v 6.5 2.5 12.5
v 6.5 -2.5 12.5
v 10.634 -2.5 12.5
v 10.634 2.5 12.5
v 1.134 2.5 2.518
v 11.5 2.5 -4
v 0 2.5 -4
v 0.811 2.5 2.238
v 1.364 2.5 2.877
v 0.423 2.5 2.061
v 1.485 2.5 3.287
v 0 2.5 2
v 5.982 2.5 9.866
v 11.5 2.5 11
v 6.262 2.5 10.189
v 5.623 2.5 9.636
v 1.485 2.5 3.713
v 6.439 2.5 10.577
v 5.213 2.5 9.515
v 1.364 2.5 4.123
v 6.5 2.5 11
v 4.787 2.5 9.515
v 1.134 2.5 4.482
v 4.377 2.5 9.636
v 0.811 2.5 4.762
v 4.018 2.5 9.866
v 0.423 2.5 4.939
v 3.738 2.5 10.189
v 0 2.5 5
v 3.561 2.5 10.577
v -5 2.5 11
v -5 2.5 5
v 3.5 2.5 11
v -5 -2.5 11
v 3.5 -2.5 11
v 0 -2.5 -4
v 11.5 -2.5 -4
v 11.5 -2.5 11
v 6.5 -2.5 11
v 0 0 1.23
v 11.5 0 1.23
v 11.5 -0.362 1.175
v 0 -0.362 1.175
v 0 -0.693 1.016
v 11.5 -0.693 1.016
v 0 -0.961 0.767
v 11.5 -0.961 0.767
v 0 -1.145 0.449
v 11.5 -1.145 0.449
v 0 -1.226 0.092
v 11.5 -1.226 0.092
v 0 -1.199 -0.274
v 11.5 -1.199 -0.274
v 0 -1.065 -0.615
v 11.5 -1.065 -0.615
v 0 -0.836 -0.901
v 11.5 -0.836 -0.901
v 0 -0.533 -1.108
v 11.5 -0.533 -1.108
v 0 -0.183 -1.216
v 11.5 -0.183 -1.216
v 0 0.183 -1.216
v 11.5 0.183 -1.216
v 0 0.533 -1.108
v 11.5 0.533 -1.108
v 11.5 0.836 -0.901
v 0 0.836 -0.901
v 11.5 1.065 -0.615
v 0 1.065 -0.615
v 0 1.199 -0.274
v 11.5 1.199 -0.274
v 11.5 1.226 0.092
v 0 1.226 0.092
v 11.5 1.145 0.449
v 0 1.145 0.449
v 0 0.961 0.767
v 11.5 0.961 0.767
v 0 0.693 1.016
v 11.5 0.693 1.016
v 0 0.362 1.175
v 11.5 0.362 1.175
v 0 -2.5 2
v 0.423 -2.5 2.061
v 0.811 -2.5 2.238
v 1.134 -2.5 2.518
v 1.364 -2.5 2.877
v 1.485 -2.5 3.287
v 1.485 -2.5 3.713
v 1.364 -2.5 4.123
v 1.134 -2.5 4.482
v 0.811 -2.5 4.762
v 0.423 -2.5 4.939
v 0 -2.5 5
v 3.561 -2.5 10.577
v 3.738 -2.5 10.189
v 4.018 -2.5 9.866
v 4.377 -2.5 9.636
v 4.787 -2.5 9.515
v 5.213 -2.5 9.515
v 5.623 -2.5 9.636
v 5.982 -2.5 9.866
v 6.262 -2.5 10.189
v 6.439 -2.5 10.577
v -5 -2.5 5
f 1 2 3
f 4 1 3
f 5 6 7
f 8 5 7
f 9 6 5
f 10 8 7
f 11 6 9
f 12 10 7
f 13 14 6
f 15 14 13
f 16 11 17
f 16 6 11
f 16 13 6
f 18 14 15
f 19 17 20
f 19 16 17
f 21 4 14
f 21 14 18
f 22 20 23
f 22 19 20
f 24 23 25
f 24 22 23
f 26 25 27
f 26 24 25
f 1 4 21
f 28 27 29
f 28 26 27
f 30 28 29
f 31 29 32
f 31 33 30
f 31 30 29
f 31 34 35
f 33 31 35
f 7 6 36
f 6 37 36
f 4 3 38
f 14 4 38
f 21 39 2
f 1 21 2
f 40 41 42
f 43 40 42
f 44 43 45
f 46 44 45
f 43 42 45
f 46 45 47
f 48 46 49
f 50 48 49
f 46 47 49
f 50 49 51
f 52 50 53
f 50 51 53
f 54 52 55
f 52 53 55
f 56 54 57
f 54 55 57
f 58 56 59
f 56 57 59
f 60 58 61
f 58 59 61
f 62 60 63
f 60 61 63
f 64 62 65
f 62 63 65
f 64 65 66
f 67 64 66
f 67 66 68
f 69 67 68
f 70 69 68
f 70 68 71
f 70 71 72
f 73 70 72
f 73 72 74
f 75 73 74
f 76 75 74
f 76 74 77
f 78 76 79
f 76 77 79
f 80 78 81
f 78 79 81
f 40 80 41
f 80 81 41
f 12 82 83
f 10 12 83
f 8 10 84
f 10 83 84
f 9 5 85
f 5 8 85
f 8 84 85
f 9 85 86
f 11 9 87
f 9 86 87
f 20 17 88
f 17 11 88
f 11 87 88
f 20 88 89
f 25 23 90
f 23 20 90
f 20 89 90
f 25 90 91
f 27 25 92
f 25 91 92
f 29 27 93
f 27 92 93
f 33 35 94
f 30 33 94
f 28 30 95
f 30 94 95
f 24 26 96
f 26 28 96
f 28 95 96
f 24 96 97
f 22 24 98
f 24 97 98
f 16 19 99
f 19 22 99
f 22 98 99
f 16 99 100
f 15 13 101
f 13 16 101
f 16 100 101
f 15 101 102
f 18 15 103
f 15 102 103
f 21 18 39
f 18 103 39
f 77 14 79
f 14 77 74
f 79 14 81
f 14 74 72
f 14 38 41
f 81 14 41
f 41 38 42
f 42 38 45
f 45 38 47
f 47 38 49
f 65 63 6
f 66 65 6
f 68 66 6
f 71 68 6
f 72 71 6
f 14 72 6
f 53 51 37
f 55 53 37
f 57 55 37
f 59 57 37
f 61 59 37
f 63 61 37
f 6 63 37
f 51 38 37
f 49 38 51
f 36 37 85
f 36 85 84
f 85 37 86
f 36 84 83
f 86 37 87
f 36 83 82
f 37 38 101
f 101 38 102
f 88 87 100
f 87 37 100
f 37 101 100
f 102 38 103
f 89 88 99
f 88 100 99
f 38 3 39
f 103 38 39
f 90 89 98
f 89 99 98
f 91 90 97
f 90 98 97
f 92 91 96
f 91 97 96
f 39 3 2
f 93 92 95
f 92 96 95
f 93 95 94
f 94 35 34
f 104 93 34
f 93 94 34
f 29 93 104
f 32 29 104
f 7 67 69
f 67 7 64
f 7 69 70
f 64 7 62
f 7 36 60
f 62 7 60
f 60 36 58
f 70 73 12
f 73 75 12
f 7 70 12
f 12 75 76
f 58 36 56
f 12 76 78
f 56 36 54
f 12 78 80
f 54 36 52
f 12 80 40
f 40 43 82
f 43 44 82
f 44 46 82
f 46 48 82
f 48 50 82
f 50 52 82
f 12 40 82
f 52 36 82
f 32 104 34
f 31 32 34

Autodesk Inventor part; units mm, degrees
ref_plane "YZ Plane" through (0, 0, 0) normal (1, 0, 0) x (0, 1, 0)
ref_plane "XZ Plane" through (0, 0, 0) normal (0, 1, 0) x (-1, 0, 0)
ref_plane "XY Plane" through (0, 0, 0) normal (0, 0, 1) x (1, 0, 0)
sketch "Sketch1" plane through (0, 0, 0) normal (0, 1, 0) x (-1, 0, 0)
  line L0 (0, -4) -> (0, 5)
  line L1 (0, 5) -> (5, 5)
  line L2 (5, 5) -> (5, 11)
  line L3 (5, 11) -> (-6.5, 11)
  line L4 (-6.5, 11) -> (-6.5, 12.5)
  line L5 (-6.5, 12.5) -> (-10.634, 12.5)
  line L6 (-10.634, 12.5) -> (-11.5, 11)
  line L7 (-11.5, 11) -> (-11.5, -4)
  line L8 (-11.5, -4) -> (0, -4)
  line L9 (0, 0) -> (-4.5, 0) construction
  arc A0 (0, 5) -> (0, 2) centre (0, 3.5) ccw
  arc A1 (-6.5, 11) -> (-3.5, 11) centre (-5, 11) ccw
  dimension "d0" = 5
  dimension "d1" = 6
  dimension "d2" = 15
  dimension "d3" = 4.5
  dimension "d4" = 1.5
  dimension "d5" = 1.5
  dimension "d6" = 6.5
  dimension "d7" = 30
  dimension "d8" = 5
  dimension "d18" = 4
extrude "Extrusion1" add sketch "Sketch1" along normal mid plane 5 contours L8 L7 L6 L5 L4 A1 L3 L2 L1 A0 L0
sketch "Sketch2" plane through (0, -2.5, 2) normal (-1, 0, 0) x (0, 0, 1)
  point P0 (-2, 2.5)
  point P1 (-2, 2.5)
hole "Hole1" at (0, 0, 0) direction (1, 0, 0) diameter 2.459 end through all thread size "M3x0.5" class "6H" standard "ANSI Metric M Profile"
properties part number "TorsoElectronicBoxLatchFrame" material "Acetal Resin, Black"
